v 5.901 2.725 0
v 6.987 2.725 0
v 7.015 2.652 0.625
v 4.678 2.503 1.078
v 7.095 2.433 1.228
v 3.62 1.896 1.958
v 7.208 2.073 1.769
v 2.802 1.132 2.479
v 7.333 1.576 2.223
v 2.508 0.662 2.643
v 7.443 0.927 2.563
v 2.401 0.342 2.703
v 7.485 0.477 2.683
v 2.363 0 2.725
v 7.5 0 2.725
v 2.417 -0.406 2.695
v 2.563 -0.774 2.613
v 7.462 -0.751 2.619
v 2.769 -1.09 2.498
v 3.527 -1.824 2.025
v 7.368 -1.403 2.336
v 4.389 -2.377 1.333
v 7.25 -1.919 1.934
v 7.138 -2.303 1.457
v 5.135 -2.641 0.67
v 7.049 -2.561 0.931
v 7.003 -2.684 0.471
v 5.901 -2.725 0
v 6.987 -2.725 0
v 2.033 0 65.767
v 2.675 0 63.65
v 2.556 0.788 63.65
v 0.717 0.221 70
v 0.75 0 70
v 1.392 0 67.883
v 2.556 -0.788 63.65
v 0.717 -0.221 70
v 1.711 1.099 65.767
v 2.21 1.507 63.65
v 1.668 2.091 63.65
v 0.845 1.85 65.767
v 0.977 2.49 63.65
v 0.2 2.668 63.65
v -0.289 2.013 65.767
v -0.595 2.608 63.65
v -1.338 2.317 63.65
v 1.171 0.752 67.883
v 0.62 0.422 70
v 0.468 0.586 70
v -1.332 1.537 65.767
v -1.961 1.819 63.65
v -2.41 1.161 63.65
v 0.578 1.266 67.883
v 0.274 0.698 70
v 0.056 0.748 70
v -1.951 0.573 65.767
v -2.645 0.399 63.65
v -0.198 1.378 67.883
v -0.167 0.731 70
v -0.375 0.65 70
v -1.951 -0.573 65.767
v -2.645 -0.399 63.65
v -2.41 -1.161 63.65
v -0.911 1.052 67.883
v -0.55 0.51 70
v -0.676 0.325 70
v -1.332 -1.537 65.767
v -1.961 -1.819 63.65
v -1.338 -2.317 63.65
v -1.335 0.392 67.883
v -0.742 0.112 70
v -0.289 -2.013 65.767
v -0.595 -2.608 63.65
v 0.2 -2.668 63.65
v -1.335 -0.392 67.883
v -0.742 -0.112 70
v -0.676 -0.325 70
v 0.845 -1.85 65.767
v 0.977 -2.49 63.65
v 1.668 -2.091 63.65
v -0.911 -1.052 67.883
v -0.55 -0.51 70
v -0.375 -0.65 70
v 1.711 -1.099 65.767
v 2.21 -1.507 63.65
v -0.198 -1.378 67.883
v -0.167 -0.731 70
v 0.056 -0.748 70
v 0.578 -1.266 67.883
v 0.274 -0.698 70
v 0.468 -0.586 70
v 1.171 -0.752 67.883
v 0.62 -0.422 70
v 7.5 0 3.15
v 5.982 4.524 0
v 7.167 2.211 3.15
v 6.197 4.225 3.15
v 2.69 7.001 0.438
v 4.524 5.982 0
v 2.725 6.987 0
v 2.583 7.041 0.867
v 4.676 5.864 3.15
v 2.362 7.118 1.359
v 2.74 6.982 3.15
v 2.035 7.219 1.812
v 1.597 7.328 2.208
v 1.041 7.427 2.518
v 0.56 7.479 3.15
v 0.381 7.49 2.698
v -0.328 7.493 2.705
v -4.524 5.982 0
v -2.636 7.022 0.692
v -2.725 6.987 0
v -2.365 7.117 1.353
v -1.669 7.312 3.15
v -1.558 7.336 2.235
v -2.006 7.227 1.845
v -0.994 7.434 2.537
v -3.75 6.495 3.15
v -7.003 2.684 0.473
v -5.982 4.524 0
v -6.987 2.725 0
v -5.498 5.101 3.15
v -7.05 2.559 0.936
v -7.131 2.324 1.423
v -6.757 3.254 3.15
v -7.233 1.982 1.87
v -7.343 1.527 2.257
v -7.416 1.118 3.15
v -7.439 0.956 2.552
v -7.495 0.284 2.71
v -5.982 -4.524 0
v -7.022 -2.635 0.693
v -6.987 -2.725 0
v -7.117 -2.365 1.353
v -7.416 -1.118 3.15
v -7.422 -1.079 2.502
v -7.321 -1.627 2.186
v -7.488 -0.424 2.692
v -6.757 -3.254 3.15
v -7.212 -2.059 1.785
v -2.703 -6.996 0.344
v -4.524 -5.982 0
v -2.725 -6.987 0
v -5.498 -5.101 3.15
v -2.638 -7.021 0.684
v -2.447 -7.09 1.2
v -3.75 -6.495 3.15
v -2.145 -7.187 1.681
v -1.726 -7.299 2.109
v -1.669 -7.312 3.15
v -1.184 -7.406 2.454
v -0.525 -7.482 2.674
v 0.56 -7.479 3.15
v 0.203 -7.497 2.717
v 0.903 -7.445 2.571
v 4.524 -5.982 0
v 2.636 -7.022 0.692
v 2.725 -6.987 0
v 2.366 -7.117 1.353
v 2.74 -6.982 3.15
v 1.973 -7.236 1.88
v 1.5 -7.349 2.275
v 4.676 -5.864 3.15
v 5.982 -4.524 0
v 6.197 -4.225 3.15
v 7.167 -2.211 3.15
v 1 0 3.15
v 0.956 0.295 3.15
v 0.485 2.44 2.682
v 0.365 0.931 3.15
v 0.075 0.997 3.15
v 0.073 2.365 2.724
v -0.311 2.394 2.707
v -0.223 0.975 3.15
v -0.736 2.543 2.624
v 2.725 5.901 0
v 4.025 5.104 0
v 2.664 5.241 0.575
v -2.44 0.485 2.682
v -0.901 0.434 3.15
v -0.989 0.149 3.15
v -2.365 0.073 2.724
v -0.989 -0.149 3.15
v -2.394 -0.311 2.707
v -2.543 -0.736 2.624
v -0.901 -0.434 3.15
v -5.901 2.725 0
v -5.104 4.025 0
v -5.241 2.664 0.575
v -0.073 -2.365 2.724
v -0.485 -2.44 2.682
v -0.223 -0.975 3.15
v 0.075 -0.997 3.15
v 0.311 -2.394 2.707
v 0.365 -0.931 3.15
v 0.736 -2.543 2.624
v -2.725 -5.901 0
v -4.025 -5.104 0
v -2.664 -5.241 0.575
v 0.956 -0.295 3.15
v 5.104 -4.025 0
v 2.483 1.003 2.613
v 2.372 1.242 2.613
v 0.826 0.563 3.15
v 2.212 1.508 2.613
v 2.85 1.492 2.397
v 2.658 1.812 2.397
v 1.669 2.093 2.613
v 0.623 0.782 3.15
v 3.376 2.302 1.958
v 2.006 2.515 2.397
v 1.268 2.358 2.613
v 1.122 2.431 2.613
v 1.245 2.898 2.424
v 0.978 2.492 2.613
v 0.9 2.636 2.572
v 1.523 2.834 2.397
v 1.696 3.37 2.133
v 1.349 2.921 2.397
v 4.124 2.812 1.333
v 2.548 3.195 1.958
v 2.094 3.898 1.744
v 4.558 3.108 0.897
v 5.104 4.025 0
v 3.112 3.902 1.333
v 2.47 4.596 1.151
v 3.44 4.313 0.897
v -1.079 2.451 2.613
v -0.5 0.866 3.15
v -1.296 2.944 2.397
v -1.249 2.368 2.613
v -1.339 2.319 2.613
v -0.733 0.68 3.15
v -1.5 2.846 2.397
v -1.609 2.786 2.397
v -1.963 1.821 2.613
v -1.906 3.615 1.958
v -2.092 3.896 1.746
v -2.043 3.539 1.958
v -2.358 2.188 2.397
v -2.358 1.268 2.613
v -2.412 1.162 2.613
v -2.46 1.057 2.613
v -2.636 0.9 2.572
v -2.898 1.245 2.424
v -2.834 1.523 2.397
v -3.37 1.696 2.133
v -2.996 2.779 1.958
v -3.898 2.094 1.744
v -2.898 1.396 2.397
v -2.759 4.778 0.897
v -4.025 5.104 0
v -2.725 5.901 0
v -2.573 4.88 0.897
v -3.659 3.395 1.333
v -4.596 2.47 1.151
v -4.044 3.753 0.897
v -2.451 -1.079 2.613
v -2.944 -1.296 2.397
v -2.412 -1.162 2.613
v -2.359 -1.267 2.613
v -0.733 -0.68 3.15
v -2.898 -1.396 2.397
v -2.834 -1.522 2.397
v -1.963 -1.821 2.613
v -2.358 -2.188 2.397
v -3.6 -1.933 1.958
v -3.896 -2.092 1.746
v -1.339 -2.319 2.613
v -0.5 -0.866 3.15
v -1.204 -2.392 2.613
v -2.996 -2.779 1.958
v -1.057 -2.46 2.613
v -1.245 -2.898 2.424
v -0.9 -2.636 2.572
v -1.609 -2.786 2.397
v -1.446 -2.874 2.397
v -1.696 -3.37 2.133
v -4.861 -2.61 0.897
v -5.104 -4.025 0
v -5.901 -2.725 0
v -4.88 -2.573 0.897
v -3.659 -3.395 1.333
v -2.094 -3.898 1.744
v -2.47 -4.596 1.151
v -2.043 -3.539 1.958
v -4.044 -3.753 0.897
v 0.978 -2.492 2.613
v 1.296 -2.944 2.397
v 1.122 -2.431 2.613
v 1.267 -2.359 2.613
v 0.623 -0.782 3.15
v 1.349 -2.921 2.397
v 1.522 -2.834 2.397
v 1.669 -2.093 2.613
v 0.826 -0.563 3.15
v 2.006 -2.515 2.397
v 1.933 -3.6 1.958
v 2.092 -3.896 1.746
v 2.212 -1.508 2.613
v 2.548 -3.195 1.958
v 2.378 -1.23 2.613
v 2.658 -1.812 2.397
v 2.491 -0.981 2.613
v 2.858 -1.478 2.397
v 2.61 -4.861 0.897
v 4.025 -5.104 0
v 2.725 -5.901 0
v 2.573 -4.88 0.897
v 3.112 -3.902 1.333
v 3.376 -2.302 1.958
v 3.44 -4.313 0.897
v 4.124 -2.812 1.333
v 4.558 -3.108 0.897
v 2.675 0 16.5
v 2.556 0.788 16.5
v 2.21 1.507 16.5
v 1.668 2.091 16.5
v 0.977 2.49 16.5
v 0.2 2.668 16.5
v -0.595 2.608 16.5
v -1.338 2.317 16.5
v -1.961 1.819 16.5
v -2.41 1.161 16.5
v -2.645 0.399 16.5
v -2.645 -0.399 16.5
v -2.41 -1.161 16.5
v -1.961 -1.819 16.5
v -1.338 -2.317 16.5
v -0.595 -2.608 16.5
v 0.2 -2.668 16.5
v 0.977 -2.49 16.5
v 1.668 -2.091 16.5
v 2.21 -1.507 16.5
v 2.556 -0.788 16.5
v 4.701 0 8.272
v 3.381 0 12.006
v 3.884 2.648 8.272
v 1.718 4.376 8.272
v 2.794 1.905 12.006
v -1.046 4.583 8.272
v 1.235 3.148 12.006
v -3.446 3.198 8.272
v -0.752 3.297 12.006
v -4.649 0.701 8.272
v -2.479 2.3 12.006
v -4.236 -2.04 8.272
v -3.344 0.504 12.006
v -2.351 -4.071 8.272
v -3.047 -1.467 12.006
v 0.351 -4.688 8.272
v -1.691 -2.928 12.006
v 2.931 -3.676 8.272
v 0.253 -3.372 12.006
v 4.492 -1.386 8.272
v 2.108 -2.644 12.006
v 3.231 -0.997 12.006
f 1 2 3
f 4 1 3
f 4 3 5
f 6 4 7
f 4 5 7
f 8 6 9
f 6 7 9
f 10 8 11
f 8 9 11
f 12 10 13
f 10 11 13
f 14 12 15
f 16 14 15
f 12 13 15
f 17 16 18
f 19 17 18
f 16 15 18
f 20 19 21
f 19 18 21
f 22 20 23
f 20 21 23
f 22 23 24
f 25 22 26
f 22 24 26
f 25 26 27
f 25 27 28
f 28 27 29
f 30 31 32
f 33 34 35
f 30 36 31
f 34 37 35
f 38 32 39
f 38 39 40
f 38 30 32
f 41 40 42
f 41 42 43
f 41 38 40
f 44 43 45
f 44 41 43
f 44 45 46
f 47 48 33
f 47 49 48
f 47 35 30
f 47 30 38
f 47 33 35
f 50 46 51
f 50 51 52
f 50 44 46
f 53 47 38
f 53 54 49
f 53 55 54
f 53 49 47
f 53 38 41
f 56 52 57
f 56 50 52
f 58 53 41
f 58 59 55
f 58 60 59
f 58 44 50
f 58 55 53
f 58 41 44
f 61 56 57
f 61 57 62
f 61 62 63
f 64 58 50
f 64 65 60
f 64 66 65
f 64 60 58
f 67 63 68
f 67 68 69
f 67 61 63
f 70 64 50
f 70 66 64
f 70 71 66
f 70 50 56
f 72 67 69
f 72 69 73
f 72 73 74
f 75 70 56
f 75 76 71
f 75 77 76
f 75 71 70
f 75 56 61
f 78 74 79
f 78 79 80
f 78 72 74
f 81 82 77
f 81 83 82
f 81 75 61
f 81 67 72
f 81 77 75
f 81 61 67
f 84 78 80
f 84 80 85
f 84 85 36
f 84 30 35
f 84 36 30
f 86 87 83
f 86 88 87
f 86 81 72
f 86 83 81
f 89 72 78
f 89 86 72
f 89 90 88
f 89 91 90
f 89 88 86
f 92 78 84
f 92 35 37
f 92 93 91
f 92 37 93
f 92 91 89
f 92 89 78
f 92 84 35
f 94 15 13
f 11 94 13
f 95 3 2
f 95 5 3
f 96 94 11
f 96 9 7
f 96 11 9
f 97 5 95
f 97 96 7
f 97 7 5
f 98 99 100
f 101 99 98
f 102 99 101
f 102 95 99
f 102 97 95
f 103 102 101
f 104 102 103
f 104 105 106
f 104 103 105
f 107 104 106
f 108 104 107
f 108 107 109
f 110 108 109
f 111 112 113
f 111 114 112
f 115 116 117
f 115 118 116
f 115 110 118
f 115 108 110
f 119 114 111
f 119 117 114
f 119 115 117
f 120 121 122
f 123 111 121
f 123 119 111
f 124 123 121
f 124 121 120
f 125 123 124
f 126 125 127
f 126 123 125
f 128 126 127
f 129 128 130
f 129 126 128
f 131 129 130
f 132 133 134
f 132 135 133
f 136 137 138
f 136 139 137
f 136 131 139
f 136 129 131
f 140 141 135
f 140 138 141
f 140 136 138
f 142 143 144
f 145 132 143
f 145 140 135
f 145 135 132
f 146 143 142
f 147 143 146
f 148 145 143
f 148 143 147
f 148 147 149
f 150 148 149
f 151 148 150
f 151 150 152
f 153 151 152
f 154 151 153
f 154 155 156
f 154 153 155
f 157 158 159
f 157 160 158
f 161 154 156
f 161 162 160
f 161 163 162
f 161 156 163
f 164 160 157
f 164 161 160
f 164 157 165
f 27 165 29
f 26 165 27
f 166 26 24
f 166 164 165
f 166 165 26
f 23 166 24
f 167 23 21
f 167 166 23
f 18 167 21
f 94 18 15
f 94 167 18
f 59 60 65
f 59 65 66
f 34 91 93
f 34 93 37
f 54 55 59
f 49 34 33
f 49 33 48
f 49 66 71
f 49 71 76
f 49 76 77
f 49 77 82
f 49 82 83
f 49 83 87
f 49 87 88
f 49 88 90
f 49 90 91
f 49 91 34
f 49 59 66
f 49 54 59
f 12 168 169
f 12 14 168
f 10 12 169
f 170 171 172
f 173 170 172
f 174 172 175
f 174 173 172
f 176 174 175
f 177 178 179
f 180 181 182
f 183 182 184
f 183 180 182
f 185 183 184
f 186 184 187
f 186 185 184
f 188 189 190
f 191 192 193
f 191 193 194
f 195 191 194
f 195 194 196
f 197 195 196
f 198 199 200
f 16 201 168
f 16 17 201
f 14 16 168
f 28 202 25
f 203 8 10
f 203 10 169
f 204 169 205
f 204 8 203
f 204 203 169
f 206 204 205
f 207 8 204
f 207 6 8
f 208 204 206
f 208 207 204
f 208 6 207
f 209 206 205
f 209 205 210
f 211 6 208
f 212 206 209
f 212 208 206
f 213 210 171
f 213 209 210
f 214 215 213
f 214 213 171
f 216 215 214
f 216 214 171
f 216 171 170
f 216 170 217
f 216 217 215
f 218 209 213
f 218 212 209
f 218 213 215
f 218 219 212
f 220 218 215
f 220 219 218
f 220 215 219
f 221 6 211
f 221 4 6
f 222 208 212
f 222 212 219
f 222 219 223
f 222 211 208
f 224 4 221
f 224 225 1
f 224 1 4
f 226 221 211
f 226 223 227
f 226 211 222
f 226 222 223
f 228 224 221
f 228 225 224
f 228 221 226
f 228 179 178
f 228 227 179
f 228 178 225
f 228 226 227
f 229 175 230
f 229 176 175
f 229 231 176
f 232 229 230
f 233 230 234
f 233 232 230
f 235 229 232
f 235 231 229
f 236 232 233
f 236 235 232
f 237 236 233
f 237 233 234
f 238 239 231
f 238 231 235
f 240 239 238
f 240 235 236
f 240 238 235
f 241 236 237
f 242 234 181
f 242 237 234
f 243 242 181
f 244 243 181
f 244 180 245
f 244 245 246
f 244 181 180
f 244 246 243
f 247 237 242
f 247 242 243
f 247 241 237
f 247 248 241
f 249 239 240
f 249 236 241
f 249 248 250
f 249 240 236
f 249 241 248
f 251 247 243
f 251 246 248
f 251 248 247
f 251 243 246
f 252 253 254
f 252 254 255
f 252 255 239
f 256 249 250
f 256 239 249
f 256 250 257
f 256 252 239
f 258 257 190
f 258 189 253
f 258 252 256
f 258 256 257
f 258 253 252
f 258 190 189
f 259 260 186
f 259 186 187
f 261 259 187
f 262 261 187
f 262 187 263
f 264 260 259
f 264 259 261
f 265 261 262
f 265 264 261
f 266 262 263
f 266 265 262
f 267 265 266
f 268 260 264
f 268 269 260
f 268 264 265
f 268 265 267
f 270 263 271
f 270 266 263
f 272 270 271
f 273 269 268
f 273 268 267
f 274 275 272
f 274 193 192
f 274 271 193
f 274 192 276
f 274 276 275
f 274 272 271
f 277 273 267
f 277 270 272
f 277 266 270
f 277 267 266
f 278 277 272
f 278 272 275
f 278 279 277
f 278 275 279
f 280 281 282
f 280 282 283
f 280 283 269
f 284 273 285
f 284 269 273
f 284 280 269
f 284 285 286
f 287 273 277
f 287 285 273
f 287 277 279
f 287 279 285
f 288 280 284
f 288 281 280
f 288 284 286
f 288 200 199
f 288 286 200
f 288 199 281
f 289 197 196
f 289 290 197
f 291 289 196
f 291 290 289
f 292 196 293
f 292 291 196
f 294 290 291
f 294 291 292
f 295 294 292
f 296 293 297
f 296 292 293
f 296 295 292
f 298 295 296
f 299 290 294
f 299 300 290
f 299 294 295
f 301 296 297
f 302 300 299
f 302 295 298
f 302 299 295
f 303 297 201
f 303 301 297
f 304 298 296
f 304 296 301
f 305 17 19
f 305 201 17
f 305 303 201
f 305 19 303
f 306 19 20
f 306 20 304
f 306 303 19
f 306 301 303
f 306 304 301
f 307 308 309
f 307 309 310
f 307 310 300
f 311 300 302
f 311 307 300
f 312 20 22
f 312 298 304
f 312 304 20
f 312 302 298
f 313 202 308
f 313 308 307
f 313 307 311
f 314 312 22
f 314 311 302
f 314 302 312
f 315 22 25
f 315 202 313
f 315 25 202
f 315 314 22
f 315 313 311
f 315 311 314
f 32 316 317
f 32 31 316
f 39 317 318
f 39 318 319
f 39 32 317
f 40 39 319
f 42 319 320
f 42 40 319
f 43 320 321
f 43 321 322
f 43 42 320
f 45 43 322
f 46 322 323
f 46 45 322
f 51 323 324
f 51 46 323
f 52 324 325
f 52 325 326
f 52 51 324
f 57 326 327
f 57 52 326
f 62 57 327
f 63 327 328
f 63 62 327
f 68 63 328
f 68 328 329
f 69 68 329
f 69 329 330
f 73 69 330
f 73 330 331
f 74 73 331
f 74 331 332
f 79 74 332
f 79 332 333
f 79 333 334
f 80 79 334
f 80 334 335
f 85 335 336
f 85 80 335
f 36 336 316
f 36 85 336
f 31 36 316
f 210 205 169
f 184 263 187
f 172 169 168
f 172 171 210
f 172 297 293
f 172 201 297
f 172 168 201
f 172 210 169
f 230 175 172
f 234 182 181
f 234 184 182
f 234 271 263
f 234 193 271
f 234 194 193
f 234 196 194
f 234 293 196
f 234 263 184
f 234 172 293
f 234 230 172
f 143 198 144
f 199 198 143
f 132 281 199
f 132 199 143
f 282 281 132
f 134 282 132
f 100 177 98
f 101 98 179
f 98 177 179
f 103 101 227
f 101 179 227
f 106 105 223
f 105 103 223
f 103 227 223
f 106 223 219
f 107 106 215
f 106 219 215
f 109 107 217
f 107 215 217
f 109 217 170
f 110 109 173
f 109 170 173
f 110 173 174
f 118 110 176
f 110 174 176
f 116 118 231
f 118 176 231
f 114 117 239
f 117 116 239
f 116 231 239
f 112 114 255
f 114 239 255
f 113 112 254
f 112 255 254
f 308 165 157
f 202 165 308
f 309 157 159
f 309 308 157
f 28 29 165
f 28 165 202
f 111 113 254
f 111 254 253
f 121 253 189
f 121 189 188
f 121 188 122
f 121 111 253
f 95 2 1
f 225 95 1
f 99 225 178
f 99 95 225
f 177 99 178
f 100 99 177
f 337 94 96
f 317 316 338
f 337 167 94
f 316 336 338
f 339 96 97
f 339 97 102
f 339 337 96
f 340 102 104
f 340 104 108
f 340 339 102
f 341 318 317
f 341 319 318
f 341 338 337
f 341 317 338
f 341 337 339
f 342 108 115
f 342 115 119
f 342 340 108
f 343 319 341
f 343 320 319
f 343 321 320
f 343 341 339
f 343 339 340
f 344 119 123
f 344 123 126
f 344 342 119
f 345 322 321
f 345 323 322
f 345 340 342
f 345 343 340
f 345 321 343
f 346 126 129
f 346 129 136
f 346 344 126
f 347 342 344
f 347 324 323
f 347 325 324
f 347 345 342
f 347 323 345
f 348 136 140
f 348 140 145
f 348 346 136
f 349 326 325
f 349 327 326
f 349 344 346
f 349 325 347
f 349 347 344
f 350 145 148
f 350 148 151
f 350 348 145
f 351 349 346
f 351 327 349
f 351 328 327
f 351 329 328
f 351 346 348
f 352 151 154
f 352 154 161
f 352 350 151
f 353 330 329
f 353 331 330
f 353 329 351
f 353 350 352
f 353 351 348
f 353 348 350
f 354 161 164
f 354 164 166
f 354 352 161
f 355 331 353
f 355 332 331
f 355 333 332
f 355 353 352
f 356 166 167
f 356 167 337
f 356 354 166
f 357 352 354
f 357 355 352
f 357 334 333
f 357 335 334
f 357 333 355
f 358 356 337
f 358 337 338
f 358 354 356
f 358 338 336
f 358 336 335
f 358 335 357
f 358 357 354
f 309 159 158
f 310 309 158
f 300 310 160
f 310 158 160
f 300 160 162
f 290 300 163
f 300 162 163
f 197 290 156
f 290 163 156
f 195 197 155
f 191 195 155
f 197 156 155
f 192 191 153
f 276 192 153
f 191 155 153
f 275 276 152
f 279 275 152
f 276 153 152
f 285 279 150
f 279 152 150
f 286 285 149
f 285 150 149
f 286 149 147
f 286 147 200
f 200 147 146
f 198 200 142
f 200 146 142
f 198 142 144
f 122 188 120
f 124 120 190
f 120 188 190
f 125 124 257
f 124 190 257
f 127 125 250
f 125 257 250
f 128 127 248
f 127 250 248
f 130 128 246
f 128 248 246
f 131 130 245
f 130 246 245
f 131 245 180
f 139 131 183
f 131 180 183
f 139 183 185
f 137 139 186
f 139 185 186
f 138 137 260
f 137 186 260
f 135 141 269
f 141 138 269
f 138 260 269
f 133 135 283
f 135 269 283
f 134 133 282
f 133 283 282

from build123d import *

# Parameters (mm, degrees)
F2_R     = 2.725
F3_DEPTH = 7.5
F4_R     = 2.725
F5_DEPTH = 7.5


with BuildPart() as f1:
    # F0 (on Front) → F1 (revolve)
    with BuildSketch(Plane.XZ):
        with BuildLine():
            Line((0, 70), (0, 3.15))
            Line((0, 3.15), (1, 3.15))
            add(Edge.make_bspline(
                [(1, 3.15), (2.04091373, 2.841939317), (4.1227411901, 2.2258179509), (5.7075803967, 0.741939317), (6.5, 0)],
                knots=[0, 0, 0, 0, 0.5, 1, 1, 1, 1], degree=3))
            Line((6.5, 0), (7.5, 0))
            Line((7.5, 0), (7.5, 3.15))
            add(Edge.make_bspline(
                [(7.5, 3.15), (5.2801080633, 6.8420764949), (3.0602161266, 10.5341529899), (2.675, 16.5)],
                knots=[0, 0, 0, 0, 0.3422357012, 0.3422357012, 0.3422357012, 0.3422357012], degree=3))
            add(Edge.make_bspline(
                [(2.675, 16.5), (2.5909368652, 17.8018868292), (2.5942435778, 19.2120538145), (2.675, 20.7182066219)],
                knots=[0.3422357012, 0.3422357012, 0.3422357012, 0.3422357012, 0.4169195057, 0.4169195057, 0.4169195057, 0.4169195057], degree=3))
            Line((2.675, 20.7182066219), (2.675, 63.65))
            Line((2.675, 63.65), (0.75, 70))
            Line((0.75, 70), (0, 70))
        make_face()
        with BuildLine():
            Line((2.675, 16.5), (2.675, 20.7182066219))
            add(Edge.make_bspline(
                [(2.675, 16.5), (2.5909368652, 17.8018868292), (2.5942435778, 19.2120538145), (2.675, 20.7182066219)],
                knots=[0.3422357012, 0.3422357012, 0.3422357012, 0.3422357012, 0.4169195057, 0.4169195057, 0.4169195057, 0.4169195057], degree=3))
        make_face()
    revolve(axis=Axis((0, 0, 35), (0, 0, 1)))

    # F2 (on Front) → F3 (cut, symmetric)
    with BuildSketch(Plane.XZ):
        Circle(F2_R)
    extrude(amount=F3_DEPTH, both=True, mode=Mode.SUBTRACT)

    # F4 (on Right) → F5 (cut, symmetric)
    with BuildSketch(Plane.YZ):
        Circle(F4_R)
    extrude(amount=F5_DEPTH, both=True, mode=Mode.SUBTRACT)


solid = f1.part
